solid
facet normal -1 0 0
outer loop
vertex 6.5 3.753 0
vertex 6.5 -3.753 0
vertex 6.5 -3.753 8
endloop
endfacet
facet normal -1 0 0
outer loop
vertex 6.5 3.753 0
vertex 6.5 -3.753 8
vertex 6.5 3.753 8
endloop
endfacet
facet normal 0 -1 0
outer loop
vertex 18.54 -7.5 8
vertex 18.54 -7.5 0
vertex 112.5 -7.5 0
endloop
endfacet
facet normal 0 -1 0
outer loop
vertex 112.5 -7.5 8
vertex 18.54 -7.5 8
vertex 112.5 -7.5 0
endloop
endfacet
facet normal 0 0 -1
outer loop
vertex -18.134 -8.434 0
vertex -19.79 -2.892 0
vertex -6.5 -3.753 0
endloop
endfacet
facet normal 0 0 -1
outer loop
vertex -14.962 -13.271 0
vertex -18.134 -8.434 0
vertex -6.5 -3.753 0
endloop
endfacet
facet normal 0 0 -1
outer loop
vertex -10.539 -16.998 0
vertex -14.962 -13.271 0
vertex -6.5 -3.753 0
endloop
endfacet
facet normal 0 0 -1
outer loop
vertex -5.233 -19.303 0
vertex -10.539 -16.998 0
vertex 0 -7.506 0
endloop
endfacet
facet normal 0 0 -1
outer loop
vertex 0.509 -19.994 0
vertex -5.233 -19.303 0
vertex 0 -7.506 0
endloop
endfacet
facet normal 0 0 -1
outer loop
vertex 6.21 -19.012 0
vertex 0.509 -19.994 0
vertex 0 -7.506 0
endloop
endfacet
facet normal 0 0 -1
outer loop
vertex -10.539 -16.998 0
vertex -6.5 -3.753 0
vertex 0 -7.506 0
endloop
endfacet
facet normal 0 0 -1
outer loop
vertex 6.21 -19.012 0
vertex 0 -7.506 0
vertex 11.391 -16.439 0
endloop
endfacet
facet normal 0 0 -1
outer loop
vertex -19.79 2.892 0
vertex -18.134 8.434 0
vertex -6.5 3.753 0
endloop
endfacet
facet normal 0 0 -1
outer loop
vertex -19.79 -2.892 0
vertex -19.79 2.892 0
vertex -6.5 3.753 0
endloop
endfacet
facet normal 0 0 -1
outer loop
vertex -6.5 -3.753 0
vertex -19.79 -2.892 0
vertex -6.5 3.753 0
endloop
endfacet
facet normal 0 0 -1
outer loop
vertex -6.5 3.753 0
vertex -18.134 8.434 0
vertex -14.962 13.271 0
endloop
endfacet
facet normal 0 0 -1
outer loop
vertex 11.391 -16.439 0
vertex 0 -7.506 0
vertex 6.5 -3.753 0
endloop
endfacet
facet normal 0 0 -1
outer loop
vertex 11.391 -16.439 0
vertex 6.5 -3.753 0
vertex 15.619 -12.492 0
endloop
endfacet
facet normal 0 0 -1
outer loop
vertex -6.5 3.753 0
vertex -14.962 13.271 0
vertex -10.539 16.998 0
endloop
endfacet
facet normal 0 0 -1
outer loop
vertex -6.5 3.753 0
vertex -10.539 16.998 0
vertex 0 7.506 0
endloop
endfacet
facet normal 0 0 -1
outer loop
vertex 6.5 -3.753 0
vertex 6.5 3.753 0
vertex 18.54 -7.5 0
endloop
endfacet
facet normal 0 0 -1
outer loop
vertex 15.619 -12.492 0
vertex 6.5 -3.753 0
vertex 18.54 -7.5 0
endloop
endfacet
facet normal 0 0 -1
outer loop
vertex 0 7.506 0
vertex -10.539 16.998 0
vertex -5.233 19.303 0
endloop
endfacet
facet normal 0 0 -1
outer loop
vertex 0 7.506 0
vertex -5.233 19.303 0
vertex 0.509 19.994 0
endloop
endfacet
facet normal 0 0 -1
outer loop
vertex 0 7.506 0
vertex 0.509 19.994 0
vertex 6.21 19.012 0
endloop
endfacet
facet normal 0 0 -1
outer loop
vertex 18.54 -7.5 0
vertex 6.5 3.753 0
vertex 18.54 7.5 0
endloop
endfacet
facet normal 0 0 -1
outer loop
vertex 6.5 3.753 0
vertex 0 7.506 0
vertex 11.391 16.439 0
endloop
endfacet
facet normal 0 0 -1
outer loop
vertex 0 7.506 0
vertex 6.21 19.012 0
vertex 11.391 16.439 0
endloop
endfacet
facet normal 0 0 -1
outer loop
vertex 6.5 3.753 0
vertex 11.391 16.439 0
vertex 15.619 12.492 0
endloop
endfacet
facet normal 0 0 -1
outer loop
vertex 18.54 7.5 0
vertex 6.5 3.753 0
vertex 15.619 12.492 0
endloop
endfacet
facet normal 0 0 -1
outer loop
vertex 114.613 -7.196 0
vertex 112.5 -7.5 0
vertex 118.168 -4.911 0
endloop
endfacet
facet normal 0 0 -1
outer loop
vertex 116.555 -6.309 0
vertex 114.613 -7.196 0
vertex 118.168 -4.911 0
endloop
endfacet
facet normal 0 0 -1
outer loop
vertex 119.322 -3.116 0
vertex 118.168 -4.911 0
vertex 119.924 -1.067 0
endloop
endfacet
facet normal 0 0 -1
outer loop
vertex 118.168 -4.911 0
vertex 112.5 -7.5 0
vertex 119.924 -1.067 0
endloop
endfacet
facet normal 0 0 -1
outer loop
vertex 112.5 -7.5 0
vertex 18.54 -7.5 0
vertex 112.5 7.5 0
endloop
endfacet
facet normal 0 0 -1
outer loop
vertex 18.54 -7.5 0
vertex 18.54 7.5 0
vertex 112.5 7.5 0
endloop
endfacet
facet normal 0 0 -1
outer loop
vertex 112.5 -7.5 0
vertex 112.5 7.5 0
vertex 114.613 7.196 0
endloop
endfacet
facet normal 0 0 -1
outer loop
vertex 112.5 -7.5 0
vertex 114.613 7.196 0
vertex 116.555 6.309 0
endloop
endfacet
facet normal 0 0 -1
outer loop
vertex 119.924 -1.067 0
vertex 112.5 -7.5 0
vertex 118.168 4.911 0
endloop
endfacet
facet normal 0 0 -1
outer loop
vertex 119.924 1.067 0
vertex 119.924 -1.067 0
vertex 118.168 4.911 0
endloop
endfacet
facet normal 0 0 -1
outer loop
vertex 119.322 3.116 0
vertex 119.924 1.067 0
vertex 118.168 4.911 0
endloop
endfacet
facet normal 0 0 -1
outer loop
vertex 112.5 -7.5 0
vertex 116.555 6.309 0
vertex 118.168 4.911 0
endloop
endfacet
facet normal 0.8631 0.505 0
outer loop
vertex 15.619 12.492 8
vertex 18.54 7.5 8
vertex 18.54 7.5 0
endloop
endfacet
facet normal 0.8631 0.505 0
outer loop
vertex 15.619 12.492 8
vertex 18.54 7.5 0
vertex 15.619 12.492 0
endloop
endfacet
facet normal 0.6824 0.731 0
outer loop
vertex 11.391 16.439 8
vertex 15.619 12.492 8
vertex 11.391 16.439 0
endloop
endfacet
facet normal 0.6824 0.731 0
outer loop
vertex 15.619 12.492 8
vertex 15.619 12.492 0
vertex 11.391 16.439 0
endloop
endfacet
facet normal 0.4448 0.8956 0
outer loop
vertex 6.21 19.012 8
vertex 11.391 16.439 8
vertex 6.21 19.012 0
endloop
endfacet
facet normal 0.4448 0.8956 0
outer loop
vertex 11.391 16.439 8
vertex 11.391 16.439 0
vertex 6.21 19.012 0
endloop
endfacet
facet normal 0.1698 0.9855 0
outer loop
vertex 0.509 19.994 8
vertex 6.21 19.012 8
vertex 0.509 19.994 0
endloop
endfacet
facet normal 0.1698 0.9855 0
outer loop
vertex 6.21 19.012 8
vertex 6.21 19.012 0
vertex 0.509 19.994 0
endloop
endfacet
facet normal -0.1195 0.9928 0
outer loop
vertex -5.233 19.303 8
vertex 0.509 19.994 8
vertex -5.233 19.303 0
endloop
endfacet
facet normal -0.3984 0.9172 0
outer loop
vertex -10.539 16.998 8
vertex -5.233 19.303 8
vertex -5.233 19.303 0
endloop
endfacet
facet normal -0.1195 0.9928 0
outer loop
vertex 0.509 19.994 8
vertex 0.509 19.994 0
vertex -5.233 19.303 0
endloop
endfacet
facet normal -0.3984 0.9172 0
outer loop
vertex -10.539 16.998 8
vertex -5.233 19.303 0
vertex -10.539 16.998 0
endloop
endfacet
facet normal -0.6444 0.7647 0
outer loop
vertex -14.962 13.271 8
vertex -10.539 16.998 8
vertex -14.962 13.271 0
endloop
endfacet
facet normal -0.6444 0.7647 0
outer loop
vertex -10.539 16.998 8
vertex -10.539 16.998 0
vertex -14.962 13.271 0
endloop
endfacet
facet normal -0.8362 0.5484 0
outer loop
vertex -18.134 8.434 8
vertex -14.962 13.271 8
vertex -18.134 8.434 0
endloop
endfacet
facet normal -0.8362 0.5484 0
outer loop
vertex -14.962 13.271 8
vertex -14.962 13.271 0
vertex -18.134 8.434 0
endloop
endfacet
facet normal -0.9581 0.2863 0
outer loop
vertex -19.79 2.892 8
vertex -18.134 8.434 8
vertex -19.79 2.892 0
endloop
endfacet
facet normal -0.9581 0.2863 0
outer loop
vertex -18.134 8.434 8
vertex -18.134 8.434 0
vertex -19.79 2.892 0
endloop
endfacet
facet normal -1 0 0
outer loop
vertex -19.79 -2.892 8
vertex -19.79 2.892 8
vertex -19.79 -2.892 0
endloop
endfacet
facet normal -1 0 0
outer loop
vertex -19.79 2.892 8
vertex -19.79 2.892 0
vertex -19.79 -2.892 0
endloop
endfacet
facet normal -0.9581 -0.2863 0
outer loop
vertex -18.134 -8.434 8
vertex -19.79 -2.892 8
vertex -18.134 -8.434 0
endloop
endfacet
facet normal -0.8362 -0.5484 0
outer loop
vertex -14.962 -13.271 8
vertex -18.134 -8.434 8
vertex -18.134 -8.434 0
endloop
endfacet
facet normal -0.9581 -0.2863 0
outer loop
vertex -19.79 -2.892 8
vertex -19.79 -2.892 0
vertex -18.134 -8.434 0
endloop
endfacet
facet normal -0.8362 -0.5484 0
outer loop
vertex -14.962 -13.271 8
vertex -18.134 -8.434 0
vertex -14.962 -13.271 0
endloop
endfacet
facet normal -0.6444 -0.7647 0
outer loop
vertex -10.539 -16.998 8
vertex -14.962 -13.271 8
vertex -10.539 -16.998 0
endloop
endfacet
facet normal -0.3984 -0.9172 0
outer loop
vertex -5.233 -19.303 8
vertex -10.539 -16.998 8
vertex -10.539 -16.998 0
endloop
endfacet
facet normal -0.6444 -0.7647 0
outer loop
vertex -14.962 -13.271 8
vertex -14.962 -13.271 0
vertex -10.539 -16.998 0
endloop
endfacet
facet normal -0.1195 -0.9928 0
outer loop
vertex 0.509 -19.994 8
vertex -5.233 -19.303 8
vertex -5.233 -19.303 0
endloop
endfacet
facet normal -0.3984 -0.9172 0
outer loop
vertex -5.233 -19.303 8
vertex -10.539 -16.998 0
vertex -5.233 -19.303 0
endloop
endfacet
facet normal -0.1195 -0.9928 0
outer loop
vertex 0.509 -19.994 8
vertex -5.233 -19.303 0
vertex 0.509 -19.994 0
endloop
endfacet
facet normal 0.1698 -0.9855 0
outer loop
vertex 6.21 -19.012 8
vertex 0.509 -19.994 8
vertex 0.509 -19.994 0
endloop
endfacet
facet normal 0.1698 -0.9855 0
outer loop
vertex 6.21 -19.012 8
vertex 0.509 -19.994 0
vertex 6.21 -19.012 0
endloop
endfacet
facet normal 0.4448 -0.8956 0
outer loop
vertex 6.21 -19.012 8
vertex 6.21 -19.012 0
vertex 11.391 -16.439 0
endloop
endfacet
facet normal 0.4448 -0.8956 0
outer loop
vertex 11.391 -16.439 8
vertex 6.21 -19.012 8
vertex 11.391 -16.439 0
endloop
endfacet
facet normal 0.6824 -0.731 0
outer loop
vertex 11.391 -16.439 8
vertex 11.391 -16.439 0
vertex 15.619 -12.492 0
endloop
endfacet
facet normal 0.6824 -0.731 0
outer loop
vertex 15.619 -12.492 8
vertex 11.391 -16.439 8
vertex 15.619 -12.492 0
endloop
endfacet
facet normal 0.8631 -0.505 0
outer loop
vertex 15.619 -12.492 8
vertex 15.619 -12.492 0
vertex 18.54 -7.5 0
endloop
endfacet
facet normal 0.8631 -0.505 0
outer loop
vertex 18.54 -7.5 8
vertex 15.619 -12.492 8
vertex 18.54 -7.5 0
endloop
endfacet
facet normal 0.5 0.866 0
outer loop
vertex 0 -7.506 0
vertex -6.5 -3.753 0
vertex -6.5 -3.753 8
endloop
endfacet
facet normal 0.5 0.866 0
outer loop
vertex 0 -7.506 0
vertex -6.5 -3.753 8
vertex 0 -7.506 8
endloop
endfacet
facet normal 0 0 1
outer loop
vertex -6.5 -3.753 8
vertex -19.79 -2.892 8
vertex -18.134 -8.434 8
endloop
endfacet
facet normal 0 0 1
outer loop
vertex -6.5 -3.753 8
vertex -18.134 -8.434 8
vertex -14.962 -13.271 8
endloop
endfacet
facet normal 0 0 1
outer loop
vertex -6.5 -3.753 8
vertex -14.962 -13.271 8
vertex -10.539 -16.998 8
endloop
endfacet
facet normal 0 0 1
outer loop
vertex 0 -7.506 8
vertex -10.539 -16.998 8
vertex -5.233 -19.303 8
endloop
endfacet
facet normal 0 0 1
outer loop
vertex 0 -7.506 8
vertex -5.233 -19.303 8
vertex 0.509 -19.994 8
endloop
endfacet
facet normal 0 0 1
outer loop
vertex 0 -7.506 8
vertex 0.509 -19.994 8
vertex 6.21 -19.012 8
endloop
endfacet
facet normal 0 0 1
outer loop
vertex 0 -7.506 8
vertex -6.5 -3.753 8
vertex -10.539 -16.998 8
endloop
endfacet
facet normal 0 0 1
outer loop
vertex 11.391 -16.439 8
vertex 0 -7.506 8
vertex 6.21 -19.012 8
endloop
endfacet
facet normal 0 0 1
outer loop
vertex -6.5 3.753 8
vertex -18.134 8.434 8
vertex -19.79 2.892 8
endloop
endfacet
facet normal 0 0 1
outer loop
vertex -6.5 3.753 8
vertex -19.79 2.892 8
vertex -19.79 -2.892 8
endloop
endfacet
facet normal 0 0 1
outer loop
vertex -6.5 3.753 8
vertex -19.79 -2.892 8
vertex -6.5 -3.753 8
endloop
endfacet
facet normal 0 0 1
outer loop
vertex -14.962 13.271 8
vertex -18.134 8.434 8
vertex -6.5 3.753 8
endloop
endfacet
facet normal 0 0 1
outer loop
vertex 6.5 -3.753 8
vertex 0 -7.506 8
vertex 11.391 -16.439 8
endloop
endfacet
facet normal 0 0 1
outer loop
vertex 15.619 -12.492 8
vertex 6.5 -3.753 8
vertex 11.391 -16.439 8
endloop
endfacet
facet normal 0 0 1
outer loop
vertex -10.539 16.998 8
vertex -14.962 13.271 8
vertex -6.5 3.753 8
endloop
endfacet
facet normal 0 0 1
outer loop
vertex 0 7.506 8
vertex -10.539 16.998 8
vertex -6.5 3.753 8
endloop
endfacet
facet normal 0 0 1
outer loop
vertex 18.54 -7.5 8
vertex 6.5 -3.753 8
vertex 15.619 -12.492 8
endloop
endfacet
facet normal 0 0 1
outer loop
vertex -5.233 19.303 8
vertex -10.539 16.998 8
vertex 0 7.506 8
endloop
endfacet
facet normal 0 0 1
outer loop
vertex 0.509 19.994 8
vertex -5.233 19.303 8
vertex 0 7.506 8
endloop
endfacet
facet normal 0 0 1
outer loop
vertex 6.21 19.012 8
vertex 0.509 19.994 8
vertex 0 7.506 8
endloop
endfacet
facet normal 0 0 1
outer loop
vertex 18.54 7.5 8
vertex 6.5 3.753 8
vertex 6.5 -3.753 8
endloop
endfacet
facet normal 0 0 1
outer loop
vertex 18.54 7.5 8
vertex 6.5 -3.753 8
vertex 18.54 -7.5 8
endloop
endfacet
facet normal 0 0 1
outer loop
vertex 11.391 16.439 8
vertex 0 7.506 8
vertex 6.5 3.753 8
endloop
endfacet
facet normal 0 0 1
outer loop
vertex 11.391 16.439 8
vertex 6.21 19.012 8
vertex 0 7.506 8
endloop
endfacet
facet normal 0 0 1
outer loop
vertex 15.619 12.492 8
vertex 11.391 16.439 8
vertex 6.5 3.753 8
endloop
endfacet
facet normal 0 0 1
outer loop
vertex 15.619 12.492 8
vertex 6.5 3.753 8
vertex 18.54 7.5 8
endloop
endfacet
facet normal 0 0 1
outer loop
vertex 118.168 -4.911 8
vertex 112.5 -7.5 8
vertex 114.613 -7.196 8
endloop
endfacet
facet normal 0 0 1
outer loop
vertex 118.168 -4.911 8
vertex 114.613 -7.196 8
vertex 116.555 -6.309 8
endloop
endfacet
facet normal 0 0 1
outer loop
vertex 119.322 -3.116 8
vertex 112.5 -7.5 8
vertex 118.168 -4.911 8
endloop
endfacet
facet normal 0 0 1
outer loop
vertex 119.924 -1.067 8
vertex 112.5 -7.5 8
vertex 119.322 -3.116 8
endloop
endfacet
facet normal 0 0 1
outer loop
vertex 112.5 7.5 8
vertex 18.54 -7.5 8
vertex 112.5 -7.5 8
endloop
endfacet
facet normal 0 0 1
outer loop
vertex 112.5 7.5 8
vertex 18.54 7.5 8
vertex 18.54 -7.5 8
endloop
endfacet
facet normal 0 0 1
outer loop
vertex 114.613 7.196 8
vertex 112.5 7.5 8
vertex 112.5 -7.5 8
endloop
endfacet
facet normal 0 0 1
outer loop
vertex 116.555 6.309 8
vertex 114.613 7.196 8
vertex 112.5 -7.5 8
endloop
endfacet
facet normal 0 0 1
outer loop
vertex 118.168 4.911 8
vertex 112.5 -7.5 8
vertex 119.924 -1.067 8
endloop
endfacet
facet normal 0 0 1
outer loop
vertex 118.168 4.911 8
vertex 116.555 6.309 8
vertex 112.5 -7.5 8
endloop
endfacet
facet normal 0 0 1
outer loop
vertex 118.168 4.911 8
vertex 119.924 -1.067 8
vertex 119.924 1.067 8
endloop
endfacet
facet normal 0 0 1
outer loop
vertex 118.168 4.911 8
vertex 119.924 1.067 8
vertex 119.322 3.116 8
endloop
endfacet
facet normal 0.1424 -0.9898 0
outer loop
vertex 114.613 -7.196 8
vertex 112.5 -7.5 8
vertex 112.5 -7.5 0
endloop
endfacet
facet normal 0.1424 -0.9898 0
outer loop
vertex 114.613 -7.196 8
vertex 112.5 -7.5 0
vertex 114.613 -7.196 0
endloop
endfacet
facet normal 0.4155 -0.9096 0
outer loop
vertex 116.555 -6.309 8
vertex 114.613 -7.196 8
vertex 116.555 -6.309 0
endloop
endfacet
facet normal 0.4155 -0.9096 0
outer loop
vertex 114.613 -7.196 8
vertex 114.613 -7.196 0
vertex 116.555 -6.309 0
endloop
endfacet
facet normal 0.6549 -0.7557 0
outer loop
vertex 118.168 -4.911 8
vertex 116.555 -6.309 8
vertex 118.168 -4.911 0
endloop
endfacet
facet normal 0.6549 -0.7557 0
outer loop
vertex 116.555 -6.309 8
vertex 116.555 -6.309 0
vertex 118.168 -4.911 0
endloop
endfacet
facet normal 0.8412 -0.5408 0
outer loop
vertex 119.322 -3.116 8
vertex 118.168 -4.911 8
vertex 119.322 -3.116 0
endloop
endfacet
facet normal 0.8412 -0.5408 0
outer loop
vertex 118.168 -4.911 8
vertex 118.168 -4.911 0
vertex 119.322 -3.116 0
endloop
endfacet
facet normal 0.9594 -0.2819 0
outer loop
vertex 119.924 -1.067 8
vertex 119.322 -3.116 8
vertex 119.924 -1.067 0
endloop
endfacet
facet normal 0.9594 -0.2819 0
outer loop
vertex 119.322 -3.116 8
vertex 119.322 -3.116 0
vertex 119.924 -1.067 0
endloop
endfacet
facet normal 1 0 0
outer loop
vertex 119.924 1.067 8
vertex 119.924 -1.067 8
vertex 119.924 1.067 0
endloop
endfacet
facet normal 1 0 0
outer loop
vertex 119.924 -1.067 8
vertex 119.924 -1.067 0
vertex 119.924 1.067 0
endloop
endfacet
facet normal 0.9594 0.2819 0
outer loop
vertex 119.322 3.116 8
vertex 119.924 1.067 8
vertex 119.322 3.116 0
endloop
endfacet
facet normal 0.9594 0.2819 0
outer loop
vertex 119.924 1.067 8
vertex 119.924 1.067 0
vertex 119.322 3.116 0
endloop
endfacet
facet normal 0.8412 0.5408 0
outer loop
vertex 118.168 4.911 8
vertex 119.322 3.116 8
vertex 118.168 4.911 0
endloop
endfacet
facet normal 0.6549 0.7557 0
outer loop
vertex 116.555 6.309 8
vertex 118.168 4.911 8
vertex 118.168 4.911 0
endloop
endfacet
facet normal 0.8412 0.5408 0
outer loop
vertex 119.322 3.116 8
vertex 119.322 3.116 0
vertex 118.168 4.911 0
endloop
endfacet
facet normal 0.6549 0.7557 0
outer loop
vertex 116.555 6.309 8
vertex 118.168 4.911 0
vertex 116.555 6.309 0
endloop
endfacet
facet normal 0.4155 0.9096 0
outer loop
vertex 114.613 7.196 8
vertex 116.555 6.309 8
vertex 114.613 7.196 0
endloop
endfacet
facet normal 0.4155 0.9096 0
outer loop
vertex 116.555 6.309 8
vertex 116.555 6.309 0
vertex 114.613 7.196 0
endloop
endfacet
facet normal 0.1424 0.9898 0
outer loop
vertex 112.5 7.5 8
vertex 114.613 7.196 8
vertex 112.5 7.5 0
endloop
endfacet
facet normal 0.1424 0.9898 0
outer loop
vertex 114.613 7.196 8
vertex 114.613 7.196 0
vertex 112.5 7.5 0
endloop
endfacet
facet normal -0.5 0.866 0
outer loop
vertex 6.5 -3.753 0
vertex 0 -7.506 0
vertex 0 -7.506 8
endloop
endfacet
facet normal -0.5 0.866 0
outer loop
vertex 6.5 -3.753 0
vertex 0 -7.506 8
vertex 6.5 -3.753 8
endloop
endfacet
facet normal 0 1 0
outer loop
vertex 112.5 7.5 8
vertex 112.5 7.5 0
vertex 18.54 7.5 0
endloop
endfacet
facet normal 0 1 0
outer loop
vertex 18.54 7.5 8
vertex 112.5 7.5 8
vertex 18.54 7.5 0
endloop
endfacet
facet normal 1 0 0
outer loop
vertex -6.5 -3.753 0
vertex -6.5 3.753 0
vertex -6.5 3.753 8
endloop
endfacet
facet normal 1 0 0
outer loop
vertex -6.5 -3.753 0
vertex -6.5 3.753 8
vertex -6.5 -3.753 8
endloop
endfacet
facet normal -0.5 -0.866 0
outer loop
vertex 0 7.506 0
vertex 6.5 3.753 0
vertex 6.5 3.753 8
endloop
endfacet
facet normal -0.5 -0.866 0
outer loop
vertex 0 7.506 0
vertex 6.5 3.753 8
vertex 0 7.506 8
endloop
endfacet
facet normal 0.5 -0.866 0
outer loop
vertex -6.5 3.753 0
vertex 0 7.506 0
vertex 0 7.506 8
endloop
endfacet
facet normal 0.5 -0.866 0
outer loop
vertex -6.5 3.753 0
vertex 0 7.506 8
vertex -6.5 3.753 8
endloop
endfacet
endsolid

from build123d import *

# Parameters (mm, degrees)
SKETCH_1_R          = 20
EXTRUDE_1_DEPTH     = 8
EXTRUDE_3_DEPTH     = 8
CUT_EXTRUDE_2_DEPTH = 122.918005233


with BuildPart() as part:
    # 草图1 → 凸台-拉伸1 (new body)
    with BuildSketch(Plane.XY):
        Circle(SKETCH_1_R)
    extrude(amount=EXTRUDE_1_DEPTH)

    # 草图4 → 凸台-拉伸3 (add)
    with BuildSketch(Plane.XY):
        with BuildLine():
            Line((0, -7.5), (112.5, -7.5))
            ThreePointArc((112.5, -7.5), (120, 0), (112.5, 7.5))
            Line((112.5, 7.5), (0, 7.5))
            ThreePointArc((0, 7.5), (-7.5, 0), (0, -7.5))
        make_face()
    extrude(amount=EXTRUDE_3_DEPTH)

    # 草图5 → 切除-拉伸2 (cut, through all)
    with BuildSketch(Plane.XY):
        Polygon((6.5, 3.75277675), (0, 7.505553499), (-6.5, 3.75277675), (-6.5, -3.75277675), (0, -7.505553499), (6.5, -3.75277675), align=None)
    extrude(amount=CUT_EXTRUDE_2_DEPTH, mode=Mode.SUBTRACT)


solid = part.part
